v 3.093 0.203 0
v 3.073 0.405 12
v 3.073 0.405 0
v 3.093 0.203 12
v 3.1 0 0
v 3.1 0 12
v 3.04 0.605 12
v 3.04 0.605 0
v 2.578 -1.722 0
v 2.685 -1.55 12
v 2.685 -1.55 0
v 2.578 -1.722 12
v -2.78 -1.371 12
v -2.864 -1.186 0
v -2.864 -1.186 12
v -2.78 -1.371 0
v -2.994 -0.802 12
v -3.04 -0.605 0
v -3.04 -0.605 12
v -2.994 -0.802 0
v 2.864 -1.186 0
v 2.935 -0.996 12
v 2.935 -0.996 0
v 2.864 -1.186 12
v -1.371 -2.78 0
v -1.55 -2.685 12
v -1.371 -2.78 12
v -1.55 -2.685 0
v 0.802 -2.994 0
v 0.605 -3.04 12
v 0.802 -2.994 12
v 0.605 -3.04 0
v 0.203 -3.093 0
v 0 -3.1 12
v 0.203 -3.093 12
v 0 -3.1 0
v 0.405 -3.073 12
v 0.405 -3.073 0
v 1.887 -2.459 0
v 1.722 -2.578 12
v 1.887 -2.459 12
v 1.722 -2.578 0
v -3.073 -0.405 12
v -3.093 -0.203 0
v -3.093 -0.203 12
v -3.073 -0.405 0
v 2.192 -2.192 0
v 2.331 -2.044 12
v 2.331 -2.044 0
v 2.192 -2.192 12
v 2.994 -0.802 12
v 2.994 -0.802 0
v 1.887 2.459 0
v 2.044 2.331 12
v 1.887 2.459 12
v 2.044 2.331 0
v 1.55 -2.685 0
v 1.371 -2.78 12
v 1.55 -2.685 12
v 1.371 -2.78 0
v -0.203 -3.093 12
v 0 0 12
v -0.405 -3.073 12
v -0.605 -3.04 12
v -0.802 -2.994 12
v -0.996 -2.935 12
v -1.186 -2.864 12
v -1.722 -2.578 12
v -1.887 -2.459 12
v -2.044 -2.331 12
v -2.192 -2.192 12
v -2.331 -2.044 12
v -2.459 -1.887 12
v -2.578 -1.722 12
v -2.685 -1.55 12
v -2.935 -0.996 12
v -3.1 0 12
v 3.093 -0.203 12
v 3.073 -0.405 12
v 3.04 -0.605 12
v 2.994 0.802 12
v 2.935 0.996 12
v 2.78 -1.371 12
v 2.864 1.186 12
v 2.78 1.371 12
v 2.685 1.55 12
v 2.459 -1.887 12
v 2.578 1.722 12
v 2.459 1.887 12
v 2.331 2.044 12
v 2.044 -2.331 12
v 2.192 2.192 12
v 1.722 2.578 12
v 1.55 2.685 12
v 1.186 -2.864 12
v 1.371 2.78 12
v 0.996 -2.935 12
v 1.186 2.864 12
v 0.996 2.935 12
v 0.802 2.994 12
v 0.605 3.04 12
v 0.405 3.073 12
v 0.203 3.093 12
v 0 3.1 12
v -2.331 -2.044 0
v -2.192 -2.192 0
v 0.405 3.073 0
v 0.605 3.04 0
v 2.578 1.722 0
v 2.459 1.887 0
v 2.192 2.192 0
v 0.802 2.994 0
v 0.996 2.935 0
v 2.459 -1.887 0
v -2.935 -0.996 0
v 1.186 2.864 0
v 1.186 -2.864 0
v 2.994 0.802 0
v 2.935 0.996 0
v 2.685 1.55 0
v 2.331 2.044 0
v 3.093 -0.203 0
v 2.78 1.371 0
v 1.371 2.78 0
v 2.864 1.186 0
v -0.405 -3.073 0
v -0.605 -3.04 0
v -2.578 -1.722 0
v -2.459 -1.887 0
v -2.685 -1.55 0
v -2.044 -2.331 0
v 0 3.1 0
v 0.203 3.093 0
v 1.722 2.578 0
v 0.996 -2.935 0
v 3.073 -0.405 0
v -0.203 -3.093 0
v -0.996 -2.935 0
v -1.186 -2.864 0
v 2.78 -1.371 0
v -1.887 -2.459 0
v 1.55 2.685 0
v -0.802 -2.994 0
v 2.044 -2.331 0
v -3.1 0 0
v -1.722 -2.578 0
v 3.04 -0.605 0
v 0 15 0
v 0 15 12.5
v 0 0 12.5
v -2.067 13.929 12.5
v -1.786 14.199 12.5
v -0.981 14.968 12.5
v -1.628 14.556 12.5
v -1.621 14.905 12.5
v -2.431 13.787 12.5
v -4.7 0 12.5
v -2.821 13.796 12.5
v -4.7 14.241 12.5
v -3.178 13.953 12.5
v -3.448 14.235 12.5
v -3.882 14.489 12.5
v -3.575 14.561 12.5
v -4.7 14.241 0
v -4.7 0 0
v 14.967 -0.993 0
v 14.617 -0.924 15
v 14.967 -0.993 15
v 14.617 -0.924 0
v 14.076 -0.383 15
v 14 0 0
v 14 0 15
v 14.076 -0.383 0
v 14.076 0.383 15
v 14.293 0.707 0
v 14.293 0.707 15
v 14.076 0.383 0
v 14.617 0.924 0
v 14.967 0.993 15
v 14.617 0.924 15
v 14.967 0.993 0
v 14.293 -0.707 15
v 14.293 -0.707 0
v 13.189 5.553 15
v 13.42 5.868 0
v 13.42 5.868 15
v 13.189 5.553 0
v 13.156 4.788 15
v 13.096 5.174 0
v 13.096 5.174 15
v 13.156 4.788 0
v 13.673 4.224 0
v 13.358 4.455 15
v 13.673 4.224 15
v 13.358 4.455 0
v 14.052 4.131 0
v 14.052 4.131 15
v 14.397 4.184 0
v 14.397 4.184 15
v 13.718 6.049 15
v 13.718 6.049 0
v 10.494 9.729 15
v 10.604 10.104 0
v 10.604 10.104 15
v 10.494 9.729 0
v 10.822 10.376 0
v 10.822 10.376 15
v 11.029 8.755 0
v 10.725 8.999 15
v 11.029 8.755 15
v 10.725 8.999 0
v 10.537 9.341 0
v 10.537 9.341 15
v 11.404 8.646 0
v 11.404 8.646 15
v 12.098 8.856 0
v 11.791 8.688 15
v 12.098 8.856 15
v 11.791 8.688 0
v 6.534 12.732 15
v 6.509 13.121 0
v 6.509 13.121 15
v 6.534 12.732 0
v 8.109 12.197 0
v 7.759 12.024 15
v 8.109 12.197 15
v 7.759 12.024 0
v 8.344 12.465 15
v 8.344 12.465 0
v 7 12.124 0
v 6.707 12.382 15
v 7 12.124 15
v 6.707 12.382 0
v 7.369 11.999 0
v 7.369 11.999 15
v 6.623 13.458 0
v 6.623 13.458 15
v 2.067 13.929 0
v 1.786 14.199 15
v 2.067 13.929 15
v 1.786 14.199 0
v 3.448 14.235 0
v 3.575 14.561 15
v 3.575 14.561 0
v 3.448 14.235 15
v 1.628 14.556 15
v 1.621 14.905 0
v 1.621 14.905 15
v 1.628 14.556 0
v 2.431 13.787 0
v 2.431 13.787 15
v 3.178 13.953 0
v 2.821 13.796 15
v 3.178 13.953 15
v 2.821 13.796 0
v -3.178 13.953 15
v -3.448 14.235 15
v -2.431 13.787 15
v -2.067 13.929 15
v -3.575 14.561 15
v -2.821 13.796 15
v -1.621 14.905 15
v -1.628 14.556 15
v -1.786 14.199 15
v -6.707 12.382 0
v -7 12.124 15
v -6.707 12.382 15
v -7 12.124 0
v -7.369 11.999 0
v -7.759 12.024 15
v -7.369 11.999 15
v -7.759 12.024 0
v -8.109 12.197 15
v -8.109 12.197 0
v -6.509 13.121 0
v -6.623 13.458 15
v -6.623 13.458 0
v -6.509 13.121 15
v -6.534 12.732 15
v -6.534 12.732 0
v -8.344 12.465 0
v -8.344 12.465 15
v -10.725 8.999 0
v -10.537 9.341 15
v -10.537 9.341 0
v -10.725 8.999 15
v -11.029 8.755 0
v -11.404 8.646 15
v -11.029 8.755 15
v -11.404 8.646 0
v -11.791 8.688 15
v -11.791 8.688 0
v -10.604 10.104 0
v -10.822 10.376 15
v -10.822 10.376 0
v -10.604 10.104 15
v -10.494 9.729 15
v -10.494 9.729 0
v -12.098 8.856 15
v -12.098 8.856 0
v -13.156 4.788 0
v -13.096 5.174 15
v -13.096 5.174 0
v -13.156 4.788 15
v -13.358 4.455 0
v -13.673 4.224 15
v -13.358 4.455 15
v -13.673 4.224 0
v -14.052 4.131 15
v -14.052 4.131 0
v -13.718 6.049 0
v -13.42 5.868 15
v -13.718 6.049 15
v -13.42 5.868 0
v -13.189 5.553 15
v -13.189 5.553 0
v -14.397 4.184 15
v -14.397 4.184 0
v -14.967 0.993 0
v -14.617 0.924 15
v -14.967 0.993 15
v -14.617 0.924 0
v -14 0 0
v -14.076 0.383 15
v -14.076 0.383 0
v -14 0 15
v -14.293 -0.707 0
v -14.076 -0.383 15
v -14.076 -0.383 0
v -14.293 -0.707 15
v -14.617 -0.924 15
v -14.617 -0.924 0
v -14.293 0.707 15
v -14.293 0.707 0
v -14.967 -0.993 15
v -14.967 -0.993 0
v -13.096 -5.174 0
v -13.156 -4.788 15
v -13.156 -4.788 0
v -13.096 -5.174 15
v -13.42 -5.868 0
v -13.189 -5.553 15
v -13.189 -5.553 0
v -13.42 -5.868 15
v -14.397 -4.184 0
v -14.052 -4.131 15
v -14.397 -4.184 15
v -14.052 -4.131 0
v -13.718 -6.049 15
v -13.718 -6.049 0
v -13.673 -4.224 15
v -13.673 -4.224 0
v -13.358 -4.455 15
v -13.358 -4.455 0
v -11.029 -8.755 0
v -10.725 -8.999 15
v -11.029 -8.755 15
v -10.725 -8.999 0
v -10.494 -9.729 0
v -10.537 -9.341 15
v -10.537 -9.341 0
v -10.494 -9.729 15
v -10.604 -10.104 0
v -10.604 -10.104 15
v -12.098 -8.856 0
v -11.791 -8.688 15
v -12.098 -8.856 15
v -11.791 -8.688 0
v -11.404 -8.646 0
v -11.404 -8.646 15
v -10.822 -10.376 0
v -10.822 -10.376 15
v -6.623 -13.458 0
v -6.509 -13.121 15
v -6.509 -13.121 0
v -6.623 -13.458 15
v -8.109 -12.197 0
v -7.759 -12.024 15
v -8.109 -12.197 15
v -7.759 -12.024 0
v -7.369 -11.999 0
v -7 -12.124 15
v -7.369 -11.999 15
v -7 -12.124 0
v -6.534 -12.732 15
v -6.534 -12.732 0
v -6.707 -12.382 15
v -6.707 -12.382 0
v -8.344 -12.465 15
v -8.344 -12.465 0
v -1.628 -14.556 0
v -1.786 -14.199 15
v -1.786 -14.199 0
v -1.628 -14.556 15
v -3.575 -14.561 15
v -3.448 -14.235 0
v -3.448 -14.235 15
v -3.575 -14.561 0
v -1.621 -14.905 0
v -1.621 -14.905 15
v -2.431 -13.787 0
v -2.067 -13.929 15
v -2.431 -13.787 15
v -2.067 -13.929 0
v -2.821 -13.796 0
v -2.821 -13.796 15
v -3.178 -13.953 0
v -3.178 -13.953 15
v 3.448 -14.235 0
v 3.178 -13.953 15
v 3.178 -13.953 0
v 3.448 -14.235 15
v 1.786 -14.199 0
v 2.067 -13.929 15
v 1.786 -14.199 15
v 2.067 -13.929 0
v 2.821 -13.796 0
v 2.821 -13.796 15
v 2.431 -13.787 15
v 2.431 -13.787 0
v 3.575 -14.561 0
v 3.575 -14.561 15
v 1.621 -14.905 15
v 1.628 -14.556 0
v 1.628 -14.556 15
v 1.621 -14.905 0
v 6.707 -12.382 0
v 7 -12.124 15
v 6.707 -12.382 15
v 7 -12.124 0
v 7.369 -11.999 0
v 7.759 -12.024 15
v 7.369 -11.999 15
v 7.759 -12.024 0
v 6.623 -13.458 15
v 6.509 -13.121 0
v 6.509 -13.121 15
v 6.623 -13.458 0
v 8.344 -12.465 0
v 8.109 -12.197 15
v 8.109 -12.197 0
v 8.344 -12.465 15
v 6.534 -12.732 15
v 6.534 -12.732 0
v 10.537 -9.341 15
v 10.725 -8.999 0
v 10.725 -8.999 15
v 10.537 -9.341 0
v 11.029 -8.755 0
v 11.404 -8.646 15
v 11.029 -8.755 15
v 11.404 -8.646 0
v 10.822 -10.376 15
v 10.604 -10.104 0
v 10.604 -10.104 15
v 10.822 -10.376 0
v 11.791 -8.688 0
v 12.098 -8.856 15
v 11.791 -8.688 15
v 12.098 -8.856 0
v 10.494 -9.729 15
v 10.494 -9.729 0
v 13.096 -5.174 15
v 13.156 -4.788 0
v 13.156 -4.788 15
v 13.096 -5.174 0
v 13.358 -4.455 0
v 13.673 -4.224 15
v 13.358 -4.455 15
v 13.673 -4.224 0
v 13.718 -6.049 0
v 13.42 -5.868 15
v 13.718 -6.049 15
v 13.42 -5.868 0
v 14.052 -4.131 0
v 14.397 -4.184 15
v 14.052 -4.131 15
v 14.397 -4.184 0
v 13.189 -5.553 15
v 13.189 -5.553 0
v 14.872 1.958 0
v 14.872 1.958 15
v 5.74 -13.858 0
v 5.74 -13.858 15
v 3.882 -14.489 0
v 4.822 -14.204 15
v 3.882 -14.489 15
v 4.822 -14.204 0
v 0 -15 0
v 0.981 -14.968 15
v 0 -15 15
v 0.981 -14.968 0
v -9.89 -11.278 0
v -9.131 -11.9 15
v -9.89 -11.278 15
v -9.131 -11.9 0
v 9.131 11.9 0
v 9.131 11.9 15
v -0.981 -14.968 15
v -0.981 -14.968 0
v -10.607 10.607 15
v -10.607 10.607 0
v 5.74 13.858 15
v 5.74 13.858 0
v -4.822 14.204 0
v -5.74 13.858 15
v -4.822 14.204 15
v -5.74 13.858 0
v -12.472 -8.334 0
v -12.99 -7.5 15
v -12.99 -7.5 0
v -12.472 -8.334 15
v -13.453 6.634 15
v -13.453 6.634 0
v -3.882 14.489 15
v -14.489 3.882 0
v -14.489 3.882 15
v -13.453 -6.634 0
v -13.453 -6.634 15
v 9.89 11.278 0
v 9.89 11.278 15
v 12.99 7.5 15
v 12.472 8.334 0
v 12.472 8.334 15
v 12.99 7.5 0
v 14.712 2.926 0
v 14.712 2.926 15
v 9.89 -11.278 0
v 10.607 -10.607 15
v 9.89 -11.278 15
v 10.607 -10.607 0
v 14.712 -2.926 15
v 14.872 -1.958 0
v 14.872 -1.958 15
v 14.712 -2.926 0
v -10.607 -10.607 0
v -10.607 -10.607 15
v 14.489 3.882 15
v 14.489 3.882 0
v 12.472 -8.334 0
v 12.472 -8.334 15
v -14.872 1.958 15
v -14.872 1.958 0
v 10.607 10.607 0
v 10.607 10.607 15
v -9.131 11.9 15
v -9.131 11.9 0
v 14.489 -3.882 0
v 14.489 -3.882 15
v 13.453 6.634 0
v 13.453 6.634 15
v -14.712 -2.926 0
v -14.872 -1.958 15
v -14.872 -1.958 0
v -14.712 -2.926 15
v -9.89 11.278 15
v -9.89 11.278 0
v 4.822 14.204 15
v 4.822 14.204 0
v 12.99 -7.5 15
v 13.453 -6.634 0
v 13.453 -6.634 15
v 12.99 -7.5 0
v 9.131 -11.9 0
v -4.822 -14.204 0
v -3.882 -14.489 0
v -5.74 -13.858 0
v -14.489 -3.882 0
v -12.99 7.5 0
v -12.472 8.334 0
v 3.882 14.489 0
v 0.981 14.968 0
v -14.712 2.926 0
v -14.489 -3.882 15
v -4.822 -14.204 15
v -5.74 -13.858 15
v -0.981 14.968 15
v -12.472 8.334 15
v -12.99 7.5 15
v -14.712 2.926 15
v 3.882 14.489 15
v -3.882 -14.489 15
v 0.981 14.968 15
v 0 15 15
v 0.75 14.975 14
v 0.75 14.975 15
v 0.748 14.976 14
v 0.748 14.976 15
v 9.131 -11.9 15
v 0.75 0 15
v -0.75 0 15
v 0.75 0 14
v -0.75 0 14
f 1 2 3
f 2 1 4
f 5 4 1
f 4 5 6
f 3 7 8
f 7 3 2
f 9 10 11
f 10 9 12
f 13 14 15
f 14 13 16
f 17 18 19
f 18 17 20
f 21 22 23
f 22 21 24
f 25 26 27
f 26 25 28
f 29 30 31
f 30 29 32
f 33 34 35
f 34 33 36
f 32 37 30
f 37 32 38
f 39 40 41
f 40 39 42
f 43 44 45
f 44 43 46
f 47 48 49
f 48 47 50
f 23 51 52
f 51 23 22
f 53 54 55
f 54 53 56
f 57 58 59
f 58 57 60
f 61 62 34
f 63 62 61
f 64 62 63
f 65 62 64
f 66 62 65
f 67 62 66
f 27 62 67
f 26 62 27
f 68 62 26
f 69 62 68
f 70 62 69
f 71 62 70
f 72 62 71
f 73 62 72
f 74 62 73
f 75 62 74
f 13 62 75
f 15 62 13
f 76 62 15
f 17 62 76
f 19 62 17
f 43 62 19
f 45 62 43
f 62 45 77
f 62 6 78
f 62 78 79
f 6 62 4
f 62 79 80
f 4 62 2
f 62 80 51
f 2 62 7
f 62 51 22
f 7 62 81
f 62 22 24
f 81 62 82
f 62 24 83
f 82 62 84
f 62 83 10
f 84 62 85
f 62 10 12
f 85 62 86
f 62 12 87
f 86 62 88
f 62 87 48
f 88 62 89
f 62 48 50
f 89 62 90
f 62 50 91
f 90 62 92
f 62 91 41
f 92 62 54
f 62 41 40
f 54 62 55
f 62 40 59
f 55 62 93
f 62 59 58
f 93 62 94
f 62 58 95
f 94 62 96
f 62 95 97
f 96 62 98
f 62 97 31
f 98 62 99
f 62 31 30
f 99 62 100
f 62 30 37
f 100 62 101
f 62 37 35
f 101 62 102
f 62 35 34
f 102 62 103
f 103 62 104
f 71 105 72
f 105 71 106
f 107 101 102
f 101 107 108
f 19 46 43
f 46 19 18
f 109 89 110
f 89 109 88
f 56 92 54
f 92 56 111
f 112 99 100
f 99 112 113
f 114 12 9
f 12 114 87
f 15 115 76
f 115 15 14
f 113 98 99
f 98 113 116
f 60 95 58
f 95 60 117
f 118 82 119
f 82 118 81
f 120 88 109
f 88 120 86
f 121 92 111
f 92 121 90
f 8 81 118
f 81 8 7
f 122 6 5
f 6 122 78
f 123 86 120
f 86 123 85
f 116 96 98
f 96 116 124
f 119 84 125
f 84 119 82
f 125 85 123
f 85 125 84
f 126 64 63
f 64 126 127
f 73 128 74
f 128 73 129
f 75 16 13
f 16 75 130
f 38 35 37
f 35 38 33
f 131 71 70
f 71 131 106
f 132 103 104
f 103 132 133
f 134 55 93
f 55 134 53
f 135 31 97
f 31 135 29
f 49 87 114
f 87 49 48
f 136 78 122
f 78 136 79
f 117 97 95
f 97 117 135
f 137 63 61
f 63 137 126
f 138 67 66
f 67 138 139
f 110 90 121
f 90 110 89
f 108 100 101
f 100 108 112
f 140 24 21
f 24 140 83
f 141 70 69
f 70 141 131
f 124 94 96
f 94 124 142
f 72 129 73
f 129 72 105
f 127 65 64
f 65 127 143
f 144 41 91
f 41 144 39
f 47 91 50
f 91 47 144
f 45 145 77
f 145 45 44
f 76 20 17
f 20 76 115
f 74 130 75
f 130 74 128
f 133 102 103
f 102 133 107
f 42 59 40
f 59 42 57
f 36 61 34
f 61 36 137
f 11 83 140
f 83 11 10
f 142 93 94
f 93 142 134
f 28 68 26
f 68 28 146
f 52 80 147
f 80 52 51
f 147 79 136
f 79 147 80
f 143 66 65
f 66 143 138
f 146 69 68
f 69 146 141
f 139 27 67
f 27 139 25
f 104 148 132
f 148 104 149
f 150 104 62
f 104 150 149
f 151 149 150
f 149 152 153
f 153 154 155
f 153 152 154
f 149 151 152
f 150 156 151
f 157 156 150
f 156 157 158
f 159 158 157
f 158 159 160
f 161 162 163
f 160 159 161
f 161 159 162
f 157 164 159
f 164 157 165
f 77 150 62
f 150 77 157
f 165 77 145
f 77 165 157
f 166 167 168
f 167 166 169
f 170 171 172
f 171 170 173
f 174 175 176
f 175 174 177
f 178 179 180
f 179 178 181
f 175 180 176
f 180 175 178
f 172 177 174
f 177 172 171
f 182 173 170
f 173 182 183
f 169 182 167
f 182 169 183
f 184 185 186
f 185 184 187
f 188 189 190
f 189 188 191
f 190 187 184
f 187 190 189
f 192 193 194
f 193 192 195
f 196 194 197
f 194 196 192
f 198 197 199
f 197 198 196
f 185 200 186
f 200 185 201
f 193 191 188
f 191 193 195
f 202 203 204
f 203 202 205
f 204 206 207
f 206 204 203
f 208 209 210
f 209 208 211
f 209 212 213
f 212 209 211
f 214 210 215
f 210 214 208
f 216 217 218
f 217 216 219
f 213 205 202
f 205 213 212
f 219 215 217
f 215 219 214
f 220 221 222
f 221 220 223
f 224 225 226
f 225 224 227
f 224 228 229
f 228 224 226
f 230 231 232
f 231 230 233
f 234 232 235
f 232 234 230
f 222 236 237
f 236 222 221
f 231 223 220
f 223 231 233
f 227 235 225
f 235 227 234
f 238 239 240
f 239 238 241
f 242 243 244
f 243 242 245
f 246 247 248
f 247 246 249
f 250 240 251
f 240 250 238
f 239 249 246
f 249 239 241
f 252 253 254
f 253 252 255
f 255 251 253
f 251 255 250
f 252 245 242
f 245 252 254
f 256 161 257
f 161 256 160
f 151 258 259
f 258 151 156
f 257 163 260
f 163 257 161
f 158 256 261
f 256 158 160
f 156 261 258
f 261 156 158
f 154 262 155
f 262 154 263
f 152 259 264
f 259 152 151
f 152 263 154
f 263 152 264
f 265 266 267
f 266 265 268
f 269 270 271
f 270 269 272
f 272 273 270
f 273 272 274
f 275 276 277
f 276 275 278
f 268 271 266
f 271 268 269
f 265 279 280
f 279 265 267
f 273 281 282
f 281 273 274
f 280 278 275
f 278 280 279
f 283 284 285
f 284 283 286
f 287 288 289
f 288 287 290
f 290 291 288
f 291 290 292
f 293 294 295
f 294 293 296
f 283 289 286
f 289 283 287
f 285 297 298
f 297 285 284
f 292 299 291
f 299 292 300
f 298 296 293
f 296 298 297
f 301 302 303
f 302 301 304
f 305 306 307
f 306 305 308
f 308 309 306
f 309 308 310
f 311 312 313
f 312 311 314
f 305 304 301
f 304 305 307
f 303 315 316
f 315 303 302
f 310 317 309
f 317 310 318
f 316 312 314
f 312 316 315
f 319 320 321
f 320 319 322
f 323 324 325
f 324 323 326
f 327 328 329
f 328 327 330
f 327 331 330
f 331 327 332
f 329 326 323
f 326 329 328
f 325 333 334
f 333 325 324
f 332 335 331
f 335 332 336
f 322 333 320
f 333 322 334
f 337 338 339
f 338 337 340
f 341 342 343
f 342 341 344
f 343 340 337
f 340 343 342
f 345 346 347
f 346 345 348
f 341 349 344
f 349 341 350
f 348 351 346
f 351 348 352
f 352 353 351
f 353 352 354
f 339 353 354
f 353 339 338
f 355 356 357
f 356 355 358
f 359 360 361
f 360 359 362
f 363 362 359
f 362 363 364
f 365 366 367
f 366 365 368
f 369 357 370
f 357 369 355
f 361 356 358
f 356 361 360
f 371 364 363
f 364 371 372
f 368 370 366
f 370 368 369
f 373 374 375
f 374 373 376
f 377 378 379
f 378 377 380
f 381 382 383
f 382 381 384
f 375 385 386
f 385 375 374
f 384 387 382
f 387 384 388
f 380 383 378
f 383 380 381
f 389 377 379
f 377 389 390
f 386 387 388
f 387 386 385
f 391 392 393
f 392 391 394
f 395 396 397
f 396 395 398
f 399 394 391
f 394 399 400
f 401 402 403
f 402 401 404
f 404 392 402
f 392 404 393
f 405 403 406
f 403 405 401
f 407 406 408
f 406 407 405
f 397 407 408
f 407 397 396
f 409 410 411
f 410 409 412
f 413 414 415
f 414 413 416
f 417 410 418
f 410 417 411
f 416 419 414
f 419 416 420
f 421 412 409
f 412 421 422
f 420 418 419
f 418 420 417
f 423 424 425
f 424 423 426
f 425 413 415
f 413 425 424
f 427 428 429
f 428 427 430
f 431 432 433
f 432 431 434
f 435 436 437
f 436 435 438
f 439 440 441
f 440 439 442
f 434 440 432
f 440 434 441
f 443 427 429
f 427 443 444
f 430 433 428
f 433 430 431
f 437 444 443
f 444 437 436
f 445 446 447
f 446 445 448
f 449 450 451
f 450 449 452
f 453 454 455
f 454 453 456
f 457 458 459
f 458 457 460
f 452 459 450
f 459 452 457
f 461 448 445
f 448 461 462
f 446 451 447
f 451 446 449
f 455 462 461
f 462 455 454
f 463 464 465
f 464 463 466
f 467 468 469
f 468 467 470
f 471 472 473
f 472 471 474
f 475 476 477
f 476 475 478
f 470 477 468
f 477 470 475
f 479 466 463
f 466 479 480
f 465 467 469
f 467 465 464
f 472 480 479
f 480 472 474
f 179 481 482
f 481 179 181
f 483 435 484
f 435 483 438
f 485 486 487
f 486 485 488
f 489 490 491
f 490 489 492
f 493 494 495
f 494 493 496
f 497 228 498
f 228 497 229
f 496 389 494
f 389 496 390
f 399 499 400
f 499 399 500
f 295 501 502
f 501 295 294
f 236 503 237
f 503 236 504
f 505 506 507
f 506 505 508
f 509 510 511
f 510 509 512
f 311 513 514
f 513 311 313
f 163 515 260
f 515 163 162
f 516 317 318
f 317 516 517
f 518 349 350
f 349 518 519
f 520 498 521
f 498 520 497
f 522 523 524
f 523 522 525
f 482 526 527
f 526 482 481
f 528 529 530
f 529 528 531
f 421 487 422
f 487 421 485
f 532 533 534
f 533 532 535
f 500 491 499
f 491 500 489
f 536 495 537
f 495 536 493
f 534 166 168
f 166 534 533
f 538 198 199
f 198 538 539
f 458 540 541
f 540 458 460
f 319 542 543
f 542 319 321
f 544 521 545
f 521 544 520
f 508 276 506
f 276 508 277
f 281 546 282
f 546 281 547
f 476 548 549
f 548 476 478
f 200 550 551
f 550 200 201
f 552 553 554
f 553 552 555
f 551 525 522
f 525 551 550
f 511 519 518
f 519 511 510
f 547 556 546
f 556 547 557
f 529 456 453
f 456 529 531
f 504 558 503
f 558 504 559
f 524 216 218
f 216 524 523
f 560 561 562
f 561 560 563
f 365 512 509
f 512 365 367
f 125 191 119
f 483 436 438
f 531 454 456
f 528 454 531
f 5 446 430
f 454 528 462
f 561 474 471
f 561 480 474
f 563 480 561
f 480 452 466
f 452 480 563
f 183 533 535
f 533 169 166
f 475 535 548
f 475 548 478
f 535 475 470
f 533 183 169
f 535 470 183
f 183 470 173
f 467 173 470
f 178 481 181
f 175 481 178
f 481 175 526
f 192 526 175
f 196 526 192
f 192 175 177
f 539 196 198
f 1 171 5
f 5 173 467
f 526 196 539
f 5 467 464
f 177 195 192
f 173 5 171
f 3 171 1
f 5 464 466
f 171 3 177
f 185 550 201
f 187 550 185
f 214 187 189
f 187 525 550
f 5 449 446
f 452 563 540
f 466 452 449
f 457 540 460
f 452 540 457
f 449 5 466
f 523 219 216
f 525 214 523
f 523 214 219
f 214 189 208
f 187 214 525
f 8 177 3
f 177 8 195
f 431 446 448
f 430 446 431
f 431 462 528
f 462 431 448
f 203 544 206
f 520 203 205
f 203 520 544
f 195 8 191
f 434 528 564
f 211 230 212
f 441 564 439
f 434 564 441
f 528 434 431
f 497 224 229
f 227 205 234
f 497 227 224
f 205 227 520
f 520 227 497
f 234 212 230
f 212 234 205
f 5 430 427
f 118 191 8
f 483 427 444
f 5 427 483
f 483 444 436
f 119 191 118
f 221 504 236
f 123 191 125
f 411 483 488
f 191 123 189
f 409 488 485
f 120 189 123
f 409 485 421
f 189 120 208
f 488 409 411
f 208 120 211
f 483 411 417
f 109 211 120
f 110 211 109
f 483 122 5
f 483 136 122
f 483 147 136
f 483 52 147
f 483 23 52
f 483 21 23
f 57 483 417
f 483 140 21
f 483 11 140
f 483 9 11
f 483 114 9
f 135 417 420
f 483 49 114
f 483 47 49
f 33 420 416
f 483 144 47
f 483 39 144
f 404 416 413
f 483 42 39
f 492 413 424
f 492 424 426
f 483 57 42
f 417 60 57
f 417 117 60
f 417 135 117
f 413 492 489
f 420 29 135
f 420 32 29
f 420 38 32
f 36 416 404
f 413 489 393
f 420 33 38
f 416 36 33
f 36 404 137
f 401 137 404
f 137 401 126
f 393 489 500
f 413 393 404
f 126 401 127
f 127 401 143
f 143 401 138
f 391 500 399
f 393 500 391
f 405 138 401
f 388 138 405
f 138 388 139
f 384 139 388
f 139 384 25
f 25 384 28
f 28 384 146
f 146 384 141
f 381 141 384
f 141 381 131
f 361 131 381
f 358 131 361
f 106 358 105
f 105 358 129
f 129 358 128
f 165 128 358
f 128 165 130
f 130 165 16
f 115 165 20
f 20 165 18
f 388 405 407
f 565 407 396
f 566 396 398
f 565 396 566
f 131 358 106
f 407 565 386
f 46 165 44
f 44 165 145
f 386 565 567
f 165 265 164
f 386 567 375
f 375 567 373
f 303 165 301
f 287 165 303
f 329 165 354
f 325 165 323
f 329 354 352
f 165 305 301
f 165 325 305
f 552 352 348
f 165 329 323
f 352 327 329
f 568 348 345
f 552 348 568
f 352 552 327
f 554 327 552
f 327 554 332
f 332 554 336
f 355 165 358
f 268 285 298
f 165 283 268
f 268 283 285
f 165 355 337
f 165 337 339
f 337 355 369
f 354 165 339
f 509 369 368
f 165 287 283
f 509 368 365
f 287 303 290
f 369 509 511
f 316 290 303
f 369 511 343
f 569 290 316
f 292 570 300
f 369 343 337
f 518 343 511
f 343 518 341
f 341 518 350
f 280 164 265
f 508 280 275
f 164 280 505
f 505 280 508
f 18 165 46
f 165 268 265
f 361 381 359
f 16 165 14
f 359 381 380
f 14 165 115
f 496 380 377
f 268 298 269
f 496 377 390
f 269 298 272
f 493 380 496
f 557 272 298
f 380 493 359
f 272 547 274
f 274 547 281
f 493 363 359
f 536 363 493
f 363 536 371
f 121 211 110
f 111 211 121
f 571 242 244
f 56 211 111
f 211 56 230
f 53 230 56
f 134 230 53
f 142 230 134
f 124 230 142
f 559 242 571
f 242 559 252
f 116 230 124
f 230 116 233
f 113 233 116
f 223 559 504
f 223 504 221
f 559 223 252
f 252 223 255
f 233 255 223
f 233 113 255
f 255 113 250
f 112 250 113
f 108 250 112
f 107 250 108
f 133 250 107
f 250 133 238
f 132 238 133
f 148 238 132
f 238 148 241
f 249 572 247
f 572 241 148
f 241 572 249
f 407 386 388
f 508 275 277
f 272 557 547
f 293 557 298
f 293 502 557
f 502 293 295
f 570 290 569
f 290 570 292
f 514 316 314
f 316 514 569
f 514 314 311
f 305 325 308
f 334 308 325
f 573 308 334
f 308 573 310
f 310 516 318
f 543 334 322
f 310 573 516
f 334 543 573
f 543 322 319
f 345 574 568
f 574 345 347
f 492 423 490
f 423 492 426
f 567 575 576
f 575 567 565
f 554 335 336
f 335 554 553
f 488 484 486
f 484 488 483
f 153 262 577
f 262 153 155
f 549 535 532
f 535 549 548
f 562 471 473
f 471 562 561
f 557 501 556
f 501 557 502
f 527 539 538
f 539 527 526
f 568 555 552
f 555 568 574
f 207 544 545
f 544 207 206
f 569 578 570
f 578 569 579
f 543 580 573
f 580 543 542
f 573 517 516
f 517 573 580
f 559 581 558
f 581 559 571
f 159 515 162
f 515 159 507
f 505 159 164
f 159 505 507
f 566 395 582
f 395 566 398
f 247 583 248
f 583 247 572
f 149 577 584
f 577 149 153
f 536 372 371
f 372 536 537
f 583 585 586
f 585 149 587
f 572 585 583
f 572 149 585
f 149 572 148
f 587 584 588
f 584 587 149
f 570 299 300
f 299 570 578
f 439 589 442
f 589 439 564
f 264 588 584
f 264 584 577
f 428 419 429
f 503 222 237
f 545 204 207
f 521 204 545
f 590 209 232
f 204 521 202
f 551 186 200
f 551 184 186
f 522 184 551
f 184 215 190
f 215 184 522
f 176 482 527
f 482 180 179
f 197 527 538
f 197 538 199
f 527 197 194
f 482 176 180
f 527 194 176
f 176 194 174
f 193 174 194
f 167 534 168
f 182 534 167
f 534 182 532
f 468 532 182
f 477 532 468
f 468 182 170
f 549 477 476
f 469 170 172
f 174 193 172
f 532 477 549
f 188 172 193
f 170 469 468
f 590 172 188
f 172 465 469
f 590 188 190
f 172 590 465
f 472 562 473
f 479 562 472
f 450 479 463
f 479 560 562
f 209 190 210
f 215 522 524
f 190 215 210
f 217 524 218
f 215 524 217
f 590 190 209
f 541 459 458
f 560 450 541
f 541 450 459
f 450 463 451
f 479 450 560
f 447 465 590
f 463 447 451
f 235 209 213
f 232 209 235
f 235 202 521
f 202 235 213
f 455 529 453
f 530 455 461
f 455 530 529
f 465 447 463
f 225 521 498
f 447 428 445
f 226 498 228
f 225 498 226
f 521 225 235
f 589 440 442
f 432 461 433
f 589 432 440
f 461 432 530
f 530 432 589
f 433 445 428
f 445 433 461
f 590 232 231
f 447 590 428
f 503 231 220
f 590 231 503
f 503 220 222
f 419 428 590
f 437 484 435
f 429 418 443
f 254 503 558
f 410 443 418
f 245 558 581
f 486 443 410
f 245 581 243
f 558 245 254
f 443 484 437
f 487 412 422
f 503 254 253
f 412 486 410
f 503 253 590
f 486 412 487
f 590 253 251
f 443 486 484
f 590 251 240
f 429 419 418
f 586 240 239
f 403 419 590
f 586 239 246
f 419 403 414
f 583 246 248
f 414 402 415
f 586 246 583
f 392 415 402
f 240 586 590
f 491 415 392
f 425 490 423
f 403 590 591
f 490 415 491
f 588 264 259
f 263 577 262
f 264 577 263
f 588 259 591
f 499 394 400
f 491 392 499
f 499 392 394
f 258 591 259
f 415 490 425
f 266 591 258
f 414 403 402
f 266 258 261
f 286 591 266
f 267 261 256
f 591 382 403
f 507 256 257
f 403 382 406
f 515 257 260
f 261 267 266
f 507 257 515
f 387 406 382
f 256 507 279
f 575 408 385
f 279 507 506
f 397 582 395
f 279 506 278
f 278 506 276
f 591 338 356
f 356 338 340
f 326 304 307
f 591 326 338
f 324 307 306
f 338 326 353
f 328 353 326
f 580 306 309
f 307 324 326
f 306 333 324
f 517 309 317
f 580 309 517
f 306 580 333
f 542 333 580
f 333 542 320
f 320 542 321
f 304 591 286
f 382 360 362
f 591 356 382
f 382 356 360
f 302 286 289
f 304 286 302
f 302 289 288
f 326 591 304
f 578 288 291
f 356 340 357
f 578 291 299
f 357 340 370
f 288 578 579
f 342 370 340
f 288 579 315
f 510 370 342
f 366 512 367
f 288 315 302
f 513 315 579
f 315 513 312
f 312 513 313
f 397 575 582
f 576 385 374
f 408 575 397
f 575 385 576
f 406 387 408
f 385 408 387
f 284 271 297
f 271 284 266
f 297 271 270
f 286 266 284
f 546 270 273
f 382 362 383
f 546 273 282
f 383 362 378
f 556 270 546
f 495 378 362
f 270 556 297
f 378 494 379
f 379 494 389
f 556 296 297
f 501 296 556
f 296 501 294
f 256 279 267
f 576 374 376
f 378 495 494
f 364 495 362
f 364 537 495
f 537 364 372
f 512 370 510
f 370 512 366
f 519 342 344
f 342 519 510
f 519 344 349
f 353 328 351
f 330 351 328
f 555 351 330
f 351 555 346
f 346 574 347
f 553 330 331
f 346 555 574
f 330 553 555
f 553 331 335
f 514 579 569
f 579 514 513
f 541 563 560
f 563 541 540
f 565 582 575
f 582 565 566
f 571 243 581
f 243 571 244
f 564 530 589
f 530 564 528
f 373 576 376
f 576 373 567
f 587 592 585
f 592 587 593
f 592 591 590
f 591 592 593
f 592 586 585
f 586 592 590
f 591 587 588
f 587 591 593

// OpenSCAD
// Replacement knob for a hotplate stirrer with a 6 mm D-shaft
// Print orientation: bottom face (with shaft bore) on the bed, z = 0

$fn = 96;

// --- Knob dimensions ---
knob_d      = 30;    // knob outer diameter
knob_h      = 15;    // knob height

// --- Shaft bore ---
shaft_d     = 6.2;   // D-shaft bore diameter (circle)
shaft_flat  = 4.7;   // distance from flat side to opposite side of circle
bore_depth  = 12;    // blind bore depth from bottom face

// --- Grip grooves ---
groove_count = 18;   // number of vertical grip grooves
groove_d     = 2;    // groove diameter (half-cylinder)

// --- Pointer groove ---
pointer_w   = 1.5;   // pointer groove width
pointer_d   = 1;     // pointer groove depth

// --- Cutting overlap ---
eps         = 0.5;   // extension past cut faces

difference() {
    // Main body
    cylinder(d = knob_d, h = knob_h);

    // D-shaped blind bore from bottom face
    translate([0, 0, -eps]) {
        cylinder(d = shaft_d, h = bore_depth + eps);
        // Flat side along -x, so the distance from flat to circle edge is shaft_d/2
        translate([-shaft_flat, 0, 0]) cube([shaft_flat, knob_d + 2*eps, bore_depth + 2*eps]);
    }

    // Vertical grip grooves along full height, centred on outer surface
    for (i = [0 : groove_count - 1])
        rotate([0, 0, i * 360 / groove_count])
            translate([knob_d / 2, 0, -eps])
                cylinder(d = groove_d, h = knob_h + 2*eps, $fn = 16);

    // Pointer groove from centre to outer edge on top face, same side as flat (-x)
    translate([0, 0, knob_h - pointer_d])
        linear_extrude(height = pointer_d)
            polygon([[-pointer_w / 2, 0], [pointer_w / 2, 0], [pointer_w / 2, knob_d / 2]]);
}
